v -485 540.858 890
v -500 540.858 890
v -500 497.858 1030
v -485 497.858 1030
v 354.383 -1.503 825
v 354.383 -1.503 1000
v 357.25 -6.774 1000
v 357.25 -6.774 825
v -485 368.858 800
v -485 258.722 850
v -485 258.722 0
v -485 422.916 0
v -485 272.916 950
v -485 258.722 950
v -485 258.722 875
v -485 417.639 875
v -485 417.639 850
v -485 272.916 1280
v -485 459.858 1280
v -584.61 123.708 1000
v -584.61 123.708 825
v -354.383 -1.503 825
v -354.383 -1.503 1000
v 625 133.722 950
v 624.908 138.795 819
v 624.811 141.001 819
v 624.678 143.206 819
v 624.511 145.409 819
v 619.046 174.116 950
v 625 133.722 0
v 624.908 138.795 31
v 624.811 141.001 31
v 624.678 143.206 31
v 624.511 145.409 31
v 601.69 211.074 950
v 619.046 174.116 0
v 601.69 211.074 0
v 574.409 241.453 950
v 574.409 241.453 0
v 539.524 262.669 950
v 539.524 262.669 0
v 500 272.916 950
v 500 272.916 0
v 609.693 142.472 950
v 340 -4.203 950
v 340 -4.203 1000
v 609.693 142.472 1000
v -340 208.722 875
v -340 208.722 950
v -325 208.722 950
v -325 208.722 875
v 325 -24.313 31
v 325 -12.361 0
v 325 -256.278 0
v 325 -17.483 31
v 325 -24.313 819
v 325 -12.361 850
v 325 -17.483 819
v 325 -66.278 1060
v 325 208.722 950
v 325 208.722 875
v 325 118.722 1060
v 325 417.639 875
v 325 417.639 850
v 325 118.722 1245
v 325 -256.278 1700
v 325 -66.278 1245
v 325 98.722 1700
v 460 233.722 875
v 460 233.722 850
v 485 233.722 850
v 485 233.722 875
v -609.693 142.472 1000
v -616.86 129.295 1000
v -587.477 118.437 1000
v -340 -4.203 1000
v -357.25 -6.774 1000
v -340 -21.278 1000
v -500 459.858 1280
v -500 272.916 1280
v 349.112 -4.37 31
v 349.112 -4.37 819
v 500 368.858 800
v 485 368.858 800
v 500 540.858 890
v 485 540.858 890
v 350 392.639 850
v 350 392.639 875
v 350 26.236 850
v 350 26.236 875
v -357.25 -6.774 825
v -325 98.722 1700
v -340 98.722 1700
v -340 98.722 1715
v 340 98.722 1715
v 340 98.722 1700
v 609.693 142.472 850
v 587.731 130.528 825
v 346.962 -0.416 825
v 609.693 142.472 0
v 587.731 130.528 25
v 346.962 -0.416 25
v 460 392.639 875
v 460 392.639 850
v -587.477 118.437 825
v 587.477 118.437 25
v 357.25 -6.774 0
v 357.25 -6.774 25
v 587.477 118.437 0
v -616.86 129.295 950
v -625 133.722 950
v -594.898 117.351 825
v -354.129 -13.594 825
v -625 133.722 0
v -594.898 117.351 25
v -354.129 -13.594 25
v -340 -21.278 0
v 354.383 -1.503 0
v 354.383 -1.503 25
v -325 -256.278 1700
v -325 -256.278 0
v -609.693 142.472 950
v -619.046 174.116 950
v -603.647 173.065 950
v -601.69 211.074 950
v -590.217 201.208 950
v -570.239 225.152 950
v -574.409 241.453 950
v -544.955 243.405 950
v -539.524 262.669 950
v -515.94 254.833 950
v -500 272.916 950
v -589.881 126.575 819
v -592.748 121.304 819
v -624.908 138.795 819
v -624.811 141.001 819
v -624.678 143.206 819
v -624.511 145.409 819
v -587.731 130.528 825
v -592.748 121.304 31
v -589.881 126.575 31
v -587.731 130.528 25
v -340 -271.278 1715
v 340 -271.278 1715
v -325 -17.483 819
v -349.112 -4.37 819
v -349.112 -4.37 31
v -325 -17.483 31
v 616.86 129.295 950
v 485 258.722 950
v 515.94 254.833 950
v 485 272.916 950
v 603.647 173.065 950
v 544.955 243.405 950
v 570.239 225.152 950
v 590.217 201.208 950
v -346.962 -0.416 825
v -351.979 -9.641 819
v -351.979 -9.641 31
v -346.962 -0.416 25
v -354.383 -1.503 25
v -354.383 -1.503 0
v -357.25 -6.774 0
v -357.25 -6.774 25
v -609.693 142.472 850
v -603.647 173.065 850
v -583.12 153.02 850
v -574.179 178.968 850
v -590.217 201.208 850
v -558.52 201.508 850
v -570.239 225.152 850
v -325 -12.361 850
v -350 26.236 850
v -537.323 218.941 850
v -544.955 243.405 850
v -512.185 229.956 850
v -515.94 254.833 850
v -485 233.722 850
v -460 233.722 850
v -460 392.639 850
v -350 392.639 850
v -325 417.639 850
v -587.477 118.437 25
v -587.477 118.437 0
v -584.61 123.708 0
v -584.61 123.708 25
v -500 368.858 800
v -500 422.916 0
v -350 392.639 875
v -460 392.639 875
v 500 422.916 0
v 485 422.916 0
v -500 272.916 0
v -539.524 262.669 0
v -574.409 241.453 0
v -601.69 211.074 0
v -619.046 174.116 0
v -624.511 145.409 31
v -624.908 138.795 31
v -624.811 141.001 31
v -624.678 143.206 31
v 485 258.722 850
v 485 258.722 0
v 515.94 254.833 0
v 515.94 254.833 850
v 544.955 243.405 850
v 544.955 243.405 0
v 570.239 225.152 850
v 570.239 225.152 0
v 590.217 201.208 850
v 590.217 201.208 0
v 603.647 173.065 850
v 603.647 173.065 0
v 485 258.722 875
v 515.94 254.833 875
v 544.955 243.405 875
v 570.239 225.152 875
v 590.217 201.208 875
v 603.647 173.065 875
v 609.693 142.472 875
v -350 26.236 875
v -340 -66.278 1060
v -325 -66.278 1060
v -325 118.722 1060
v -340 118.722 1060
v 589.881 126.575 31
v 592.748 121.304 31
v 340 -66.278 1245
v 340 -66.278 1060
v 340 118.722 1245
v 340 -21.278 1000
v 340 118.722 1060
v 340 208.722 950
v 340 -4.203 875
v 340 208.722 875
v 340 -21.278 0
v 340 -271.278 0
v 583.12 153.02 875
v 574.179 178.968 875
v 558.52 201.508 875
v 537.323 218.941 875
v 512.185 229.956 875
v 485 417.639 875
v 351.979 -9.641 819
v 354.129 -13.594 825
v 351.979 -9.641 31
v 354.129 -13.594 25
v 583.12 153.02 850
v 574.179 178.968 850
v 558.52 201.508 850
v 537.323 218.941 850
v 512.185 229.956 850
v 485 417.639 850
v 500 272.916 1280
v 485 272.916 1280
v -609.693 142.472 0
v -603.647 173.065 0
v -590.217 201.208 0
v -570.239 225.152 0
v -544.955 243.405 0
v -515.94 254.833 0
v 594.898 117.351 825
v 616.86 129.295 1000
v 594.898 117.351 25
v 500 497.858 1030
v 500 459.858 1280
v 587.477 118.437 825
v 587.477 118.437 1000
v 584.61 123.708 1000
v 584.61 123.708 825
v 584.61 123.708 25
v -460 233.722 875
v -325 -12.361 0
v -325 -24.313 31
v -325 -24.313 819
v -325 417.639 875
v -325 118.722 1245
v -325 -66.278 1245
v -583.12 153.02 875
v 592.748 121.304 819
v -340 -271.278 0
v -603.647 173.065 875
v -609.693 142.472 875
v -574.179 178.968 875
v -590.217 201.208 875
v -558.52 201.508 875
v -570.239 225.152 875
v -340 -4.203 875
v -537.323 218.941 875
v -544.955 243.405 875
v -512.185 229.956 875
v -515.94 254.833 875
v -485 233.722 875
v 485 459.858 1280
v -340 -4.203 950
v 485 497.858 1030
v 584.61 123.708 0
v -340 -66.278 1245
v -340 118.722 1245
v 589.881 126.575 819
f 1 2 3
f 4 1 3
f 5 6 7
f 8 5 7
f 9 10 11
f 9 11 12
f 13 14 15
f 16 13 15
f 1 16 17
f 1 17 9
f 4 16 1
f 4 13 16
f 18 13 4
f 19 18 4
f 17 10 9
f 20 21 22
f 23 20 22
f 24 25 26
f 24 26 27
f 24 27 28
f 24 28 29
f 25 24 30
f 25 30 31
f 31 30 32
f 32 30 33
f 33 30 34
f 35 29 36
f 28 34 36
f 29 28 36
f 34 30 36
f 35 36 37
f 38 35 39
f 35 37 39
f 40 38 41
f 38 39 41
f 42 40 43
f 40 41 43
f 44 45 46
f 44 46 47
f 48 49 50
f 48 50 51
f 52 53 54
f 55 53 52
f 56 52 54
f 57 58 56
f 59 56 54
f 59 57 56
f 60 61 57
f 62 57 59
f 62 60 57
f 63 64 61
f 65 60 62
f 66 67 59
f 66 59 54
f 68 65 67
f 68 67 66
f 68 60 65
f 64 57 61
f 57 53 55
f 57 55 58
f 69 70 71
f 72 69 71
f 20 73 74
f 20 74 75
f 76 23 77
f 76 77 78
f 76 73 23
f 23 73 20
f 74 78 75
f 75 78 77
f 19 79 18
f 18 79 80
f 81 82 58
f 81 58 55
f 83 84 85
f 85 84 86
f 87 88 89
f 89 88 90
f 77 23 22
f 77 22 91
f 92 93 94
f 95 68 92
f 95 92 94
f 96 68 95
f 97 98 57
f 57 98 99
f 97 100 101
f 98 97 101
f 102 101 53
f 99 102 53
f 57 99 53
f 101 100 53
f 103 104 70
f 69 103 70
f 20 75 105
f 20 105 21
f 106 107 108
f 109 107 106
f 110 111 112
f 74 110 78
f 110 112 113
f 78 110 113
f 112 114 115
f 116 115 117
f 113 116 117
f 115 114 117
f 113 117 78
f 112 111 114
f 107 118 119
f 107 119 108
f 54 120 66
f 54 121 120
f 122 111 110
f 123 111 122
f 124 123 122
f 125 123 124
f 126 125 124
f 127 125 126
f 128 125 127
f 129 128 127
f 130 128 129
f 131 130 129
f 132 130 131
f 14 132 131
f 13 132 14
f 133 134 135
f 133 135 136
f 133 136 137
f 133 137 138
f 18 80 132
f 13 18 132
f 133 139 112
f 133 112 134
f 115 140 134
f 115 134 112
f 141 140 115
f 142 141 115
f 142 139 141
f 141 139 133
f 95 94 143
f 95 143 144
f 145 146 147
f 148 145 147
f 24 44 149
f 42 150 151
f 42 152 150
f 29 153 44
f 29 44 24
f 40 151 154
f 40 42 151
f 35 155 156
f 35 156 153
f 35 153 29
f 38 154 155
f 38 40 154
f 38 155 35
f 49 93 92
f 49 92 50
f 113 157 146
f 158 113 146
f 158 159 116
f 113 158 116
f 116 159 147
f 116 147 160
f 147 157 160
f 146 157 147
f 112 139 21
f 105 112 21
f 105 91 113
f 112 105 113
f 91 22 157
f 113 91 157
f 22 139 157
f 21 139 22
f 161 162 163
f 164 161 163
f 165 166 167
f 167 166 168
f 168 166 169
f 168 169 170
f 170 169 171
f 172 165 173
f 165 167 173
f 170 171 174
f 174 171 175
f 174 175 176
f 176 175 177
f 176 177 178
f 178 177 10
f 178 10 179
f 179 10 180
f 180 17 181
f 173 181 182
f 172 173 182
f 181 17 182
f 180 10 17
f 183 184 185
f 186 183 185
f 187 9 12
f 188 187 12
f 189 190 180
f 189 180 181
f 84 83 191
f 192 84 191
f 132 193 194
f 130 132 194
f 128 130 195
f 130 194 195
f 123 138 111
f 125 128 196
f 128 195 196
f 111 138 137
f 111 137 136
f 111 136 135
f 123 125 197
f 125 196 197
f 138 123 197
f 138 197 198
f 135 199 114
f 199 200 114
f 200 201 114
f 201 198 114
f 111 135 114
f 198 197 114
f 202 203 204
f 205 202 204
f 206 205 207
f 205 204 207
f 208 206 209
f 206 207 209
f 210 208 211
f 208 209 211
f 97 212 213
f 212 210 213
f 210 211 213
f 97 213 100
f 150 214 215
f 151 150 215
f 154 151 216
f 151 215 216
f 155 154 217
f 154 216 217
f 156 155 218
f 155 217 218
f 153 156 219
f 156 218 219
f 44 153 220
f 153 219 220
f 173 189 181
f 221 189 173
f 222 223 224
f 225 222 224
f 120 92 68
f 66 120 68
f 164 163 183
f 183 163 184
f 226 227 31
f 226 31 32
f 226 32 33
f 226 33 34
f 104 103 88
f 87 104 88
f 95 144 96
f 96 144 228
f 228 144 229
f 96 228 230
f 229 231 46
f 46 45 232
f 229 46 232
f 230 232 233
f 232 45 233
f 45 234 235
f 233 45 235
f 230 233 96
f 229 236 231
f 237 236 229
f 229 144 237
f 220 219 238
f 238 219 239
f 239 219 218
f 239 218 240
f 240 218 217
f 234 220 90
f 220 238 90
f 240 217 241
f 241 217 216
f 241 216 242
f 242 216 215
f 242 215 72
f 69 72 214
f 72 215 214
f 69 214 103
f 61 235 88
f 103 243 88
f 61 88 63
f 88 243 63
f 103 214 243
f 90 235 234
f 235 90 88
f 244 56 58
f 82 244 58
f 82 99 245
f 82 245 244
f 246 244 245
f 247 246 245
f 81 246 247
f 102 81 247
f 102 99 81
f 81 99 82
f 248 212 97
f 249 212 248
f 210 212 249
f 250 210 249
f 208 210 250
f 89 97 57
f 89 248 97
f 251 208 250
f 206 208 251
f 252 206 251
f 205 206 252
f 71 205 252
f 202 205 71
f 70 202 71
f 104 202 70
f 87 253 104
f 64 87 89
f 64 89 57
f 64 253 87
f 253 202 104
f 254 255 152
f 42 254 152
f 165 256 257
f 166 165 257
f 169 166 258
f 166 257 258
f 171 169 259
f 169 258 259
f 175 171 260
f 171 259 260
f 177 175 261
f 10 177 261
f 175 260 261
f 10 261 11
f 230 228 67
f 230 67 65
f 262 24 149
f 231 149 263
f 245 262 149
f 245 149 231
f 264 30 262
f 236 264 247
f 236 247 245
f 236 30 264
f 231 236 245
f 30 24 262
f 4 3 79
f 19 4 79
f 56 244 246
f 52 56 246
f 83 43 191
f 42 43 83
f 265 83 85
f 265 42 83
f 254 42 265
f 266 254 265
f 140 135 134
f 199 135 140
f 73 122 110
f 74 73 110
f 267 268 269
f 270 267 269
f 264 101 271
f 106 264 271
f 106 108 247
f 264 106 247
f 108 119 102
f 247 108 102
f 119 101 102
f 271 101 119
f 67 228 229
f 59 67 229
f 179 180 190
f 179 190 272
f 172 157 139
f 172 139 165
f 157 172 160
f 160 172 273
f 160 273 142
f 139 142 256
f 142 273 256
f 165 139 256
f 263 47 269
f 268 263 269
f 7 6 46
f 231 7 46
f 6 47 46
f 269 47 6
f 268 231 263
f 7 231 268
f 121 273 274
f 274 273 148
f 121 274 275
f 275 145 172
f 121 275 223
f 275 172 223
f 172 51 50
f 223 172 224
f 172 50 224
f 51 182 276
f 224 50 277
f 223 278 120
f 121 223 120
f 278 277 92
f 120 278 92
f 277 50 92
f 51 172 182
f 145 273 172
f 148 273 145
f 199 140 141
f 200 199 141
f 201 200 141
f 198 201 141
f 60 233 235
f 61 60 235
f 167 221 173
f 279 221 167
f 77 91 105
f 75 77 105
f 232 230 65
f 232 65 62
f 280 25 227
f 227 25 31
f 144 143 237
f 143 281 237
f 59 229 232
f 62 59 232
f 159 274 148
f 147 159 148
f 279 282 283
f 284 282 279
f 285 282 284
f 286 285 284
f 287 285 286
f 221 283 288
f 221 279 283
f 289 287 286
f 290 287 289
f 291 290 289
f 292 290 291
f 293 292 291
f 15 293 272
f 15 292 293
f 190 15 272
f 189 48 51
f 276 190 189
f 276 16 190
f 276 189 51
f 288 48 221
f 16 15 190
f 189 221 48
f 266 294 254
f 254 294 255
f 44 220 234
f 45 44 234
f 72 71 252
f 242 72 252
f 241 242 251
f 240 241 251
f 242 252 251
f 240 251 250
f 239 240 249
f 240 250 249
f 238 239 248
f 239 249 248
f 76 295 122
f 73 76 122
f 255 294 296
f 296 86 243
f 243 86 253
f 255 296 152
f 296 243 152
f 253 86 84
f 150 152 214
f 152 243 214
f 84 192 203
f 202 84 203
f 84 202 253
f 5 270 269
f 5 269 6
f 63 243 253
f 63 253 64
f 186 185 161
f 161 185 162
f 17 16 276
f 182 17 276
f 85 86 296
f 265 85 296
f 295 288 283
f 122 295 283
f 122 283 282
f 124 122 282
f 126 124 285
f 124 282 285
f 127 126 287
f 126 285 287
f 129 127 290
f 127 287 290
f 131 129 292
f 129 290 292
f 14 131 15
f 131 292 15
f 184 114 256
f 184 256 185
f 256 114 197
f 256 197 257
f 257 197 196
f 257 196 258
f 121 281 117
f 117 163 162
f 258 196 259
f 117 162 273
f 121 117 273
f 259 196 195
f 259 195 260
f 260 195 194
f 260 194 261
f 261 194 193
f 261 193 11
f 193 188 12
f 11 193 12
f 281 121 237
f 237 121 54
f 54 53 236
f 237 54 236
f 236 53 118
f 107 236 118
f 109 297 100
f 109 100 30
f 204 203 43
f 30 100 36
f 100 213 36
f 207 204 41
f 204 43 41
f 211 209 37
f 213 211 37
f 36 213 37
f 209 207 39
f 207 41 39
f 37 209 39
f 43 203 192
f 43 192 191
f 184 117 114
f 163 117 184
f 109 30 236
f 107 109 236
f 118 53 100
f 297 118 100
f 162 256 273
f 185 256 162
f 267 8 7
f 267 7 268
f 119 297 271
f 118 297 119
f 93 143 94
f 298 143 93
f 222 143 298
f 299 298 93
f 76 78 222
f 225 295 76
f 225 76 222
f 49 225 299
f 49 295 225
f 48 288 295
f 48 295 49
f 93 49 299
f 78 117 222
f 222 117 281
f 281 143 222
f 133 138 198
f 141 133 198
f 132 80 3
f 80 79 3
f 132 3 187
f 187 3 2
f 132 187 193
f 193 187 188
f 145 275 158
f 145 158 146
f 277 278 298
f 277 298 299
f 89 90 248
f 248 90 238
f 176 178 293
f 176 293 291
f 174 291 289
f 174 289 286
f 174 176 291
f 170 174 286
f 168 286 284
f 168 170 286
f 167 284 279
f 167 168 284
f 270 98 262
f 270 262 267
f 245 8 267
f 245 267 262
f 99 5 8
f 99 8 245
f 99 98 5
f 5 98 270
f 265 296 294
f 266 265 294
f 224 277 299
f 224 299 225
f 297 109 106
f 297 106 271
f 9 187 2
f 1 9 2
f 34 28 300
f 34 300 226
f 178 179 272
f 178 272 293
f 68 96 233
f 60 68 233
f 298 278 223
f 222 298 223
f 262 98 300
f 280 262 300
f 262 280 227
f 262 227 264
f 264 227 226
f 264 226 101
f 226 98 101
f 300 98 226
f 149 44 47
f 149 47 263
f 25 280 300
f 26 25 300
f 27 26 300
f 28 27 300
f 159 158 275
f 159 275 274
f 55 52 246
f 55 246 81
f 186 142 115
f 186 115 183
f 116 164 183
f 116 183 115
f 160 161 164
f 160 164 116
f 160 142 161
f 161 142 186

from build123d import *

# Parameters (mm, degrees)
BOSS_EXTRUDE1_DEPTH  = 950
CUT_EXTRUDE1_REACH   = 1533.987
BOSS_EXTRUDE2_REACH  = 1533.987
SKETCH4_W            = 970
SKETCH4_H            = 267.941802888
CUT_EXTRUDE2_DEPTH   = 480
BOSS_EXTRUDE4_DEPTH  = 50
SKETCH14_W           = 25
SKETCH14_H           = 138.177258536
BOSS_EXTRUDE9_DEPTH  = 25
BOSS_EXTRUDE10_START = -25
BOSS_EXTRUDE10_DEPTH = 25
BOSS_EXTRUDE11_DEPTH = 25
BOSS_EXTRUDE12_DEPTH = 25
SKETCH18_W           = 160
SKETCH18_H           = 25
BOSS_EXTRUDE13_DEPTH = 25
SKETCH19_W           = 274.073507304
SKETCH19_H           = 800
CUT_EXTRUDE3_DEPTH   = 25
CUT_EXTRUDE4_DEPTH   = 1168.808883951
CUT_EXTRUDE5_START   = -45
SKETCH22_W           = 788
SKETCH22_H           = 6
CUT_EXTRUDE5_DEPTH   = 350
BOSS_EXTRUDE14_DEPTH = 15
SKETCH24_W           = 650
SKETCH24_H           = 750
BOSS_EXTRUDE15_DEPTH = 15
SKETCH25_W           = 680
SKETCH25_H           = 370
BOSS_EXTRUDE16_DEPTH = 15
CUT_EXTRUDE6_REACH   = 2042.828
SKETCH26_W           = 185
SKETCH26_H           = 185


with BuildPart() as part:
    # Sketch1 → Boss-Extrude1 (new body)
    with BuildSketch(Plane.XY):
        with BuildLine():
            Line((-625, 133.722285201), (-340, -21.277714799))
            Line((-340, -21.277714799), (-340, -271.277714799))
            Line((-340, -271.277714799), (340, -271.277714799))
            Line((340, -271.277714799), (340, -21.277714799))
            Line((340, -21.277714799), (625, 133.722285201))
            ThreePointArc((625, 133.722285201), (589.16333328, 227.263719871), (500, 272.916394272))
            Line((500, 272.916394272), (500, 422.916394272))
            Line((500, 422.916394272), (485, 422.916394272))
            Line((485, 422.916394272), (485, 407.916394272))
            Line((485, 407.916394272), (485, 258.722285201))
            ThreePointArc((485, 258.722285201), (570.238559505, 225.151973889), (609.693359356, 142.472492778))
            Line((609.693359356, 142.472492778), (325, -12.360737749))
            Line((325, -12.360737749), (325, -256.277714799))
            Line((325, -256.277714799), (-325, -256.277714799))
            Line((-325, -256.277714799), (-325, -12.360737749))
            Line((-325, -12.360737749), (-609.693359356, 142.472492778))
            ThreePointArc((-609.693359356, 142.472492778), (-570.238559505, 225.151973889), (-485, 258.722285201))
            Line((-485, 258.722285201), (-485, 407.916394272))
            Line((-485, 407.916394272), (-485, 422.916394272))
            Line((-485, 422.916394272), (-500, 422.916394272))
            Line((-500, 422.916394272), (-500, 272.916394272))
            ThreePointArc((-500, 272.916394272), (-589.16333328, 227.263719871), (-625, 133.722285201))
        make_face()
    extrude(amount=BOSS_EXTRUDE1_DEPTH)

    # Cut-Extrude1: up to this face of the body (flat: up to its plane)
    cut_extrude1_end = Plane(part.part.faces().sort_by_distance((-500, 347.916394272, 475))[0])
    # Sketch2 → Cut-Extrude1 (cut, up to the picked face)
    with BuildSketch(Plane(origin=(500, 0, 0), x_dir=(0, 0, -1), z_dir=(1, 0, 0)), mode=Mode.PRIVATE) as cut_extrude1_sk1:
        Polygon((-950, 358.722285201), (0, 422.916394272), (-950, 422.916394272), align=None)
    cut_extrude1_tool1 = split(extrude(cut_extrude1_sk1.sketch, amount=-CUT_EXTRUDE1_REACH, mode=Mode.PRIVATE), bisect_by=cut_extrude1_end, keep=Keep.BOTH, mode=Mode.PRIVATE)
    add(cut_extrude1_tool1.solids().sort_by(Axis((500, 401.518358, 633.333333), (-1, 0, 0)))[0], mode=Mode.SUBTRACT)

    # Boss-Extrude2: up to this face of the body (flat: up to its plane)
    boss_extrude2_end = Plane(part.part.faces().sort_by_distance((500, 333.324179095, 431.896465862))[0])
    # Sketch3 → Boss-Extrude2 (add, up to the picked face)
    with BuildSketch(Plane.ZY.offset(500), mode=Mode.PRIVATE) as boss_extrude2_sk1:
        Polygon((800, 368.85819716), (890, 540.85819716), (1030, 497.85819716), (1280, 459.85819716), (1280, 272.916394272), (800, 272.916394272), align=None)
    boss_extrude2_tool1 = split(extrude(boss_extrude2_sk1.sketch, amount=-BOSS_EXTRUDE2_REACH, mode=Mode.PRIVATE), bisect_by=boss_extrude2_end, keep=Keep.BOTH, mode=Mode.PRIVATE)
    add(boss_extrude2_tool1.solids().sort_by(Axis((-500, 382.129187, 1038.198063), (1, 0, 0)))[0])

    # Sketch4 → Cut-Extrude2 (cut)
    with BuildSketch(Plane.XY.offset(1280)):
        with Locations((0, 406.887295716)):
            Rectangle(SKETCH4_W, SKETCH4_H)
    extrude(amount=-CUT_EXTRUDE2_DEPTH, mode=Mode.SUBTRACT)

    # Sketch9 → Boss-Extrude4 (add)
    with BuildSketch(Plane.XY.offset(950)):
        Polygon((-609.693359356, 142.472492778), (-616.859938559, 129.295234242), (-340, -21.277714799), (-332.833420796, -8.100456263), align=None)
    boss_extrude4 = extrude(amount=BOSS_EXTRUDE4_DEPTH)

    # Sketch14 → Boss-Extrude9 (add)
    with BuildSketch(Plane(origin=(-485, 0, 0), x_dir=(0, 0, -1), z_dir=(1, 0, 0))):
        with Locations((-862.5, 327.810914469)):
            Rectangle(SKETCH14_W, SKETCH14_H)
    boss_extrude9 = extrude(amount=BOSS_EXTRUDE9_DEPTH)

    # Sketch15 → Boss-Extrude10 (add)
    with BuildSketch(Plane.XY.offset(875).offset(BOSS_EXTRUDE10_START)):
        with BuildLine():
            Line((-460, 258.722285201), (-460, 233.722285201))
            Line((-460, 233.722285201), (-485, 233.722285201))
            ThreePointArc((-485, 233.722285201), (-555.050087415, 205.087439536), (-584.98270599, 135.581990265))
            Line((-584.98270599, 135.581990265), (-587.731261796, 130.528194105))
            Line((-587.731261796, 130.528194105), (-609.693359356, 142.472492778))
            ThreePointArc((-609.693359356, 142.472492778), (-570.238559505, 225.151973889), (-485, 258.722285201))
            Line((-485, 258.722285201), (-460, 258.722285201))
        make_face()
    boss_extrude10 = extrude(amount=BOSS_EXTRUDE10_DEPTH)

    # Sketch16 → Boss-Extrude11 (add)
    with BuildSketch(Plane.XY.offset(875)):
        Polygon((-587.731261796, 130.528194105), (-325, -12.360737749), (-325, 12.639262251), (-583.120237767, 153.020444195), align=None)
    boss_extrude11 = extrude(amount=-BOSS_EXTRUDE11_DEPTH)

    # Sketch17 → Boss-Extrude12 (add)
    with BuildSketch(Plane.XY.offset(875)):
        Polygon((-325, 12.639262251), (-325, 392.639262251), (-350, 392.639262251), (-350, 26.23575348), align=None)
    boss_extrude12 = extrude(amount=-BOSS_EXTRUDE12_DEPTH)

    # Sketch18 → Boss-Extrude13 (add)
    with BuildSketch(Plane.XY.offset(875)):
        with Locations((-405, 405.139262251)):
            Rectangle(SKETCH18_W, SKETCH18_H)
    boss_extrude13 = extrude(amount=-BOSS_EXTRUDE13_DEPTH)

    # Sketch19 → Cut-Extrude3 (cut)
    with BuildSketch(Plane(origin=(-79.374447411, -145.946564595, 0), x_dir=(0.8784839023828743, -0.47777194690998404, 0), z_dir=(0.47777194690998404, 0.8784839023828743, 0))):
        with Locations((-441.638408187, -425)):
            Rectangle(SKETCH19_W, SKETCH19_H)
    cut_extrude3 = extrude(amount=-CUT_EXTRUDE3_DEPTH, mode=Mode.SUBTRACT)

    # Sketch21 → Cut-Extrude4 (cut, symmetric)
    with BuildSketch(Plane(origin=(0, 0, 825), x_dir=(-1, 0, 0), z_dir=(0, 0, -1))):
        Polygon((584.610332143, 123.708384863), (354.382974735, -1.502984955), (357.249606416, -6.773888369), (587.476963824, 118.437481449), align=None)
    cut_extrude4 = extrude(amount=CUT_EXTRUDE4_DEPTH, both=True, mode=Mode.SUBTRACT)

    # Sketch22 → Cut-Extrude5 (cut)
    with BuildSketch(Plane(origin=(-508.356814385, 276.4747587, 0), x_dir=(0, 0, -1), z_dir=(0.8784839023828743, -0.477771946909984, 0)).offset(CUT_EXTRUDE5_START)):
        with Locations((-425, -173.634591879)):
            Rectangle(SKETCH22_W, SKETCH22_H)
    cut_extrude5 = extrude(amount=CUT_EXTRUDE5_DEPTH, mode=Mode.SUBTRACT)

    # Mirror1: Boss-Extrude4, Boss-Extrude9, Boss-Extrude10, Boss-Extrude11, Boss-Extrude12, Boss-Extrude13, Cut-Extrude3, Cut-Extrude4, Cut-Extrude5 across plane
    add(boss_extrude4.mirror(Plane(origin=(0, 0, 0), x_dir=(0, 0, 1), z_dir=(1, 0, 0))))
    add(boss_extrude9.mirror(Plane(origin=(0, 0, 0), x_dir=(0, 0, 1), z_dir=(1, 0, 0))))
    add(boss_extrude10.mirror(Plane(origin=(0, 0, 0), x_dir=(0, 0, 1), z_dir=(1, 0, 0))))
    add(boss_extrude11.mirror(Plane(origin=(0, 0, 0), x_dir=(0, 0, 1), z_dir=(1, 0, 0))))
    add(boss_extrude12.mirror(Plane(origin=(0, 0, 0), x_dir=(0, 0, 1), z_dir=(1, 0, 0))))
    add(boss_extrude13.mirror(Plane(origin=(0, 0, 0), x_dir=(0, 0, 1), z_dir=(1, 0, 0))))
    add(cut_extrude3.mirror(Plane(origin=(0, 0, 0), x_dir=(0, 0, 1), z_dir=(1, 0, 0))), mode=Mode.SUBTRACT)
    add(cut_extrude4.mirror(Plane(origin=(0, 0, 0), x_dir=(0, 0, 1), z_dir=(1, 0, 0))), mode=Mode.SUBTRACT)
    add(cut_extrude5.mirror(Plane(origin=(0, 0, 0), x_dir=(0, 0, 1), z_dir=(1, 0, 0))), mode=Mode.SUBTRACT)

    # Sketch23 → Boss-Extrude14 (add)
    with BuildSketch(Plane.ZY.offset(340)):
        Polygon((950, -271.277714799), (1700, -271.277714799), (1700, 98.722285201), (950, 208.722285201), (873.5, 208.722285201), (873.5, -21.277714799), (950, -21.277714799), align=None)
    boss_extrude14 = extrude(amount=-BOSS_EXTRUDE14_DEPTH)

    # Mirror2: Boss-Extrude14 across plane
    add(boss_extrude14.mirror(Plane(origin=(0, 0, 0), x_dir=(0, 0, 1), z_dir=(1, 0, 0))))

    # Sketch24 → Boss-Extrude15 (add)
    with BuildSketch(Plane(origin=(0, -256.277714799, 0), x_dir=(1, 0, 0), z_dir=(0, 1, 0))):
        with Locations((0, -1325)):
            Rectangle(SKETCH24_W, SKETCH24_H)
    extrude(amount=-BOSS_EXTRUDE15_DEPTH)

    # Sketch25 → Boss-Extrude16 (add)
    with BuildSketch(Plane.XY.offset(1700)):
        with Locations((0, -86.277714799)):
            Rectangle(SKETCH25_W, SKETCH25_H)
    extrude(amount=BOSS_EXTRUDE16_DEPTH)

    # Cut-Extrude6: up to this face of the body (flat: up to its plane)
    cut_extrude6_end = Plane(part.part.faces().sort_by_distance((-340, -90.018652178, 958.920592754))[0])
    # Sketch26 → Cut-Extrude6 (cut, up to the picked face)
    with BuildSketch(Plane(origin=(340, 0, 0), x_dir=(0, 0, -1), z_dir=(1, 0, 0)), mode=Mode.PRIVATE) as cut_extrude6_sk1:
        with Locations((-1152.5, 26.222285201)):
            Rectangle(SKETCH26_W, SKETCH26_H)
    cut_extrude6_tool1 = split(extrude(cut_extrude6_sk1.sketch, amount=-CUT_EXTRUDE6_REACH, mode=Mode.PRIVATE), bisect_by=cut_extrude6_end, keep=Keep.BOTH, mode=Mode.PRIVATE)
    add(cut_extrude6_tool1.solids().sort_by(Axis((340, 26.222285, 1152.5), (-1, 0, 0)))[0], mode=Mode.SUBTRACT)


solid = part.part
